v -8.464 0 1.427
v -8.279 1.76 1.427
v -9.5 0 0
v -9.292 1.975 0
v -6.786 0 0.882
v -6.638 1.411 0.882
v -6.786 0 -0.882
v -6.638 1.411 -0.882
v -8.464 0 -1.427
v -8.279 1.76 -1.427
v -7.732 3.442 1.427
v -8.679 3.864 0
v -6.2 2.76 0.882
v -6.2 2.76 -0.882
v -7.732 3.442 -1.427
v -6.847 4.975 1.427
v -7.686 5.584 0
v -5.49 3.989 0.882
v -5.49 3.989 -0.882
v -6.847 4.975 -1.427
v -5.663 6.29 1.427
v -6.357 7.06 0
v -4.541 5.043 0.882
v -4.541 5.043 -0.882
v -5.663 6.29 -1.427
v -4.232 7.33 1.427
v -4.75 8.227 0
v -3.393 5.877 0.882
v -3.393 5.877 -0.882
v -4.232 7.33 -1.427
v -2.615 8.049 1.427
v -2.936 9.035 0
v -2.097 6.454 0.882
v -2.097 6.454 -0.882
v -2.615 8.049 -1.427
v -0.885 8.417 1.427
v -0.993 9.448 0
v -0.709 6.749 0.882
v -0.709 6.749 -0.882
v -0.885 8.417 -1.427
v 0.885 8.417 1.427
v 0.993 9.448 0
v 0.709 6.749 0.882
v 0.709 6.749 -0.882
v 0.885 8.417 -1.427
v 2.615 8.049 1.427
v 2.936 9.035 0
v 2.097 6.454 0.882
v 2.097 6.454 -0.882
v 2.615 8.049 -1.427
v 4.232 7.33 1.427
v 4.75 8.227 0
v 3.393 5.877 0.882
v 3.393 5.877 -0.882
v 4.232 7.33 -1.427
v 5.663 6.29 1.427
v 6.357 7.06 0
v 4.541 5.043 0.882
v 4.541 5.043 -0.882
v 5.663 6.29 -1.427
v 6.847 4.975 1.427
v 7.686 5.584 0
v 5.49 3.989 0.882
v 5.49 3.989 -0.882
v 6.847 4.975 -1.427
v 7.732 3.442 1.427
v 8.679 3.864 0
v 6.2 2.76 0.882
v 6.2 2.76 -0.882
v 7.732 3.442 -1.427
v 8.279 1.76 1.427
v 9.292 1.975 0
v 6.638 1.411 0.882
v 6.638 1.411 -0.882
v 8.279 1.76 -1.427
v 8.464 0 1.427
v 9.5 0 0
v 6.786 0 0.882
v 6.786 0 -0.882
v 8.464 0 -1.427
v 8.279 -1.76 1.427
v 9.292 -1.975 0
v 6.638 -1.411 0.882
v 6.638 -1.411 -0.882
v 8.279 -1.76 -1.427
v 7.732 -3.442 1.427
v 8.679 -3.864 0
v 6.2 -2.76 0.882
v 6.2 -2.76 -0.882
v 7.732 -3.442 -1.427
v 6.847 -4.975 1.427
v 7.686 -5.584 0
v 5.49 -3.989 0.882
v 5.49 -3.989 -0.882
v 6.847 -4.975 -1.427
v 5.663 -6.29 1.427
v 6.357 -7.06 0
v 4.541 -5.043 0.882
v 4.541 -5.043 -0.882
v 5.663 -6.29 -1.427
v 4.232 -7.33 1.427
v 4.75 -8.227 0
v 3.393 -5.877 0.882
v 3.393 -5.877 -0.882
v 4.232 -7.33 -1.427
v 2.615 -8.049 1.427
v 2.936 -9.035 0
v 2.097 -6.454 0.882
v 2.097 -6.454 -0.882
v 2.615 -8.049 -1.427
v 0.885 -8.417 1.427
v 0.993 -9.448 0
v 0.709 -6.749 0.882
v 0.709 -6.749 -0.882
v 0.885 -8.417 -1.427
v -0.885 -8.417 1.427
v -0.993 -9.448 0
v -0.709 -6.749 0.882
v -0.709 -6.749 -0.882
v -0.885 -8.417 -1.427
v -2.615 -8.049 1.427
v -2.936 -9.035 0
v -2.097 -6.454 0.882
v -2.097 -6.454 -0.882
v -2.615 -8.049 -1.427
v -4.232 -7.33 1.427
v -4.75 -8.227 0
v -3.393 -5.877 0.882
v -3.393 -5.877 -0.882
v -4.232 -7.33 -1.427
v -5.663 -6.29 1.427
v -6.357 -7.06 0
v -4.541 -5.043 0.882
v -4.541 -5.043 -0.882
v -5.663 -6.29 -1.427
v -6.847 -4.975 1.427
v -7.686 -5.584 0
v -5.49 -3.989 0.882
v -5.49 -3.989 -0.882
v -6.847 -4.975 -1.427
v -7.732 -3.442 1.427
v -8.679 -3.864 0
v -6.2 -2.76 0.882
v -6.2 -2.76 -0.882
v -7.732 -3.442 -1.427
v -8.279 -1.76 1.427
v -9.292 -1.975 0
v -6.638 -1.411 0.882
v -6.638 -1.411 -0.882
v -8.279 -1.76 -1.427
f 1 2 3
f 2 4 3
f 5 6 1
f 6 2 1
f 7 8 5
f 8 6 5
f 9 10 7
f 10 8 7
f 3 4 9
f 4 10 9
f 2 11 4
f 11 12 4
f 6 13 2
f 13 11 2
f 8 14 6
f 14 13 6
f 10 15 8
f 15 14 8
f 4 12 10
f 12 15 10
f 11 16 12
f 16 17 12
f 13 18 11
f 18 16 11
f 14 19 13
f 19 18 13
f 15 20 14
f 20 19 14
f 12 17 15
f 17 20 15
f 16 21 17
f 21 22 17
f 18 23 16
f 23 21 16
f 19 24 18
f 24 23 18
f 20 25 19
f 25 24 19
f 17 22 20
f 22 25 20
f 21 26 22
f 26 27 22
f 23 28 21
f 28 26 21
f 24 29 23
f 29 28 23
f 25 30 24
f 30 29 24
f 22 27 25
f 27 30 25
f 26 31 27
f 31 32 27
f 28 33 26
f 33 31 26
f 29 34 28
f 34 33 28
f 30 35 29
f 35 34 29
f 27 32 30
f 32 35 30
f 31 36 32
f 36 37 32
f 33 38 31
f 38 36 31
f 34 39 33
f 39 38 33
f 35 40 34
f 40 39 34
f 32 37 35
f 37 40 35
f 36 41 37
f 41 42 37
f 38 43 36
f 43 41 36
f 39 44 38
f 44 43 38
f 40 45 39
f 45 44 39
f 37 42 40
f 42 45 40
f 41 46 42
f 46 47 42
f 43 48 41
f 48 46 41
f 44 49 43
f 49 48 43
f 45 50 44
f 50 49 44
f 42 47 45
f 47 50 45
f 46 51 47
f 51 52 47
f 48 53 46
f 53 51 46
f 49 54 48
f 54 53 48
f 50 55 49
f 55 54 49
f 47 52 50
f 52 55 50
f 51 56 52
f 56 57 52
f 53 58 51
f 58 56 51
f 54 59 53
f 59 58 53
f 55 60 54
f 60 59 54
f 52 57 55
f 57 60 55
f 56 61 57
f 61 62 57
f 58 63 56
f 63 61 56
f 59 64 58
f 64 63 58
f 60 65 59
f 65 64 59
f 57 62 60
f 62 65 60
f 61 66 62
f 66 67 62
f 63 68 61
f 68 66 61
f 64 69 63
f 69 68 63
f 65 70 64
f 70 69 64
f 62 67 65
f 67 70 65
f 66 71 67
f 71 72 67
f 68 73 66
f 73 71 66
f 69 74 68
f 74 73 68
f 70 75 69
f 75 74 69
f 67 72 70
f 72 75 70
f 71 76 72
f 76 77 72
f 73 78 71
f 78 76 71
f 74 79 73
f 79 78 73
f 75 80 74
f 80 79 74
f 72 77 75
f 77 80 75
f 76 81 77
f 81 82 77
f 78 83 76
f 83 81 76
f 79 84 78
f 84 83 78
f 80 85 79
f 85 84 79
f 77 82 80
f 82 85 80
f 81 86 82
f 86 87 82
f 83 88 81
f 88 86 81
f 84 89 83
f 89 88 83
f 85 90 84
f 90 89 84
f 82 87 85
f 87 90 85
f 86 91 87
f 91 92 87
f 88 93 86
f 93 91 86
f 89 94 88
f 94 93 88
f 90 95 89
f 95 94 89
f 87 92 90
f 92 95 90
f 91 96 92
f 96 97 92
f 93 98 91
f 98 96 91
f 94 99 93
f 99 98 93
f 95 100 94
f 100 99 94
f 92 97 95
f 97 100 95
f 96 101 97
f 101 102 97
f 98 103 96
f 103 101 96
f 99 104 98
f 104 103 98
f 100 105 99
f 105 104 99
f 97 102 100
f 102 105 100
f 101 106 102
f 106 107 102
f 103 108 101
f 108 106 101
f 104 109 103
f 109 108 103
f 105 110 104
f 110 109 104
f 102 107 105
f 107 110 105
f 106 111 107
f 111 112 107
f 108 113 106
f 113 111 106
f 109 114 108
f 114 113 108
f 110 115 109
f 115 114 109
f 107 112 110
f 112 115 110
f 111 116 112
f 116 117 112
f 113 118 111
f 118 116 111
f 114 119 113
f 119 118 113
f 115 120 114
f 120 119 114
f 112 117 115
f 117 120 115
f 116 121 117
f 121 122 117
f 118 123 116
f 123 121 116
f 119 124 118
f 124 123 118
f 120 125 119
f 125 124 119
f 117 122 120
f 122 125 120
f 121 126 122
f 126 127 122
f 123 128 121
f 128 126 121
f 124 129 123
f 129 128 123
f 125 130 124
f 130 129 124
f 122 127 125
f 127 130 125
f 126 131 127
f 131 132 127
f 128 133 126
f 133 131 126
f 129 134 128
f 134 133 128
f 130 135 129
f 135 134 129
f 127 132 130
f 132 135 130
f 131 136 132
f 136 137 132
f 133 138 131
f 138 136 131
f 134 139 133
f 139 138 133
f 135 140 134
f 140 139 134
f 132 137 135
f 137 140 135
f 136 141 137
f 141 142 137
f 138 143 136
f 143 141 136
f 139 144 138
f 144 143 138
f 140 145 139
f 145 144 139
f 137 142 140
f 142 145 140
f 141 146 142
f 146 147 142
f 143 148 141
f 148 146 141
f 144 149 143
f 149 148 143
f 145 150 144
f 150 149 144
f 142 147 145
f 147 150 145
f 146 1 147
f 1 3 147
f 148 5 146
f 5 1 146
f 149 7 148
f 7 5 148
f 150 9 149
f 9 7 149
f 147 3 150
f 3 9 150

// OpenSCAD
// A ring
// An example whose folder starts with a digit, so its slug needs a prefix.
rotate_extrude() translate([8, 0]) circle(d = 3);
